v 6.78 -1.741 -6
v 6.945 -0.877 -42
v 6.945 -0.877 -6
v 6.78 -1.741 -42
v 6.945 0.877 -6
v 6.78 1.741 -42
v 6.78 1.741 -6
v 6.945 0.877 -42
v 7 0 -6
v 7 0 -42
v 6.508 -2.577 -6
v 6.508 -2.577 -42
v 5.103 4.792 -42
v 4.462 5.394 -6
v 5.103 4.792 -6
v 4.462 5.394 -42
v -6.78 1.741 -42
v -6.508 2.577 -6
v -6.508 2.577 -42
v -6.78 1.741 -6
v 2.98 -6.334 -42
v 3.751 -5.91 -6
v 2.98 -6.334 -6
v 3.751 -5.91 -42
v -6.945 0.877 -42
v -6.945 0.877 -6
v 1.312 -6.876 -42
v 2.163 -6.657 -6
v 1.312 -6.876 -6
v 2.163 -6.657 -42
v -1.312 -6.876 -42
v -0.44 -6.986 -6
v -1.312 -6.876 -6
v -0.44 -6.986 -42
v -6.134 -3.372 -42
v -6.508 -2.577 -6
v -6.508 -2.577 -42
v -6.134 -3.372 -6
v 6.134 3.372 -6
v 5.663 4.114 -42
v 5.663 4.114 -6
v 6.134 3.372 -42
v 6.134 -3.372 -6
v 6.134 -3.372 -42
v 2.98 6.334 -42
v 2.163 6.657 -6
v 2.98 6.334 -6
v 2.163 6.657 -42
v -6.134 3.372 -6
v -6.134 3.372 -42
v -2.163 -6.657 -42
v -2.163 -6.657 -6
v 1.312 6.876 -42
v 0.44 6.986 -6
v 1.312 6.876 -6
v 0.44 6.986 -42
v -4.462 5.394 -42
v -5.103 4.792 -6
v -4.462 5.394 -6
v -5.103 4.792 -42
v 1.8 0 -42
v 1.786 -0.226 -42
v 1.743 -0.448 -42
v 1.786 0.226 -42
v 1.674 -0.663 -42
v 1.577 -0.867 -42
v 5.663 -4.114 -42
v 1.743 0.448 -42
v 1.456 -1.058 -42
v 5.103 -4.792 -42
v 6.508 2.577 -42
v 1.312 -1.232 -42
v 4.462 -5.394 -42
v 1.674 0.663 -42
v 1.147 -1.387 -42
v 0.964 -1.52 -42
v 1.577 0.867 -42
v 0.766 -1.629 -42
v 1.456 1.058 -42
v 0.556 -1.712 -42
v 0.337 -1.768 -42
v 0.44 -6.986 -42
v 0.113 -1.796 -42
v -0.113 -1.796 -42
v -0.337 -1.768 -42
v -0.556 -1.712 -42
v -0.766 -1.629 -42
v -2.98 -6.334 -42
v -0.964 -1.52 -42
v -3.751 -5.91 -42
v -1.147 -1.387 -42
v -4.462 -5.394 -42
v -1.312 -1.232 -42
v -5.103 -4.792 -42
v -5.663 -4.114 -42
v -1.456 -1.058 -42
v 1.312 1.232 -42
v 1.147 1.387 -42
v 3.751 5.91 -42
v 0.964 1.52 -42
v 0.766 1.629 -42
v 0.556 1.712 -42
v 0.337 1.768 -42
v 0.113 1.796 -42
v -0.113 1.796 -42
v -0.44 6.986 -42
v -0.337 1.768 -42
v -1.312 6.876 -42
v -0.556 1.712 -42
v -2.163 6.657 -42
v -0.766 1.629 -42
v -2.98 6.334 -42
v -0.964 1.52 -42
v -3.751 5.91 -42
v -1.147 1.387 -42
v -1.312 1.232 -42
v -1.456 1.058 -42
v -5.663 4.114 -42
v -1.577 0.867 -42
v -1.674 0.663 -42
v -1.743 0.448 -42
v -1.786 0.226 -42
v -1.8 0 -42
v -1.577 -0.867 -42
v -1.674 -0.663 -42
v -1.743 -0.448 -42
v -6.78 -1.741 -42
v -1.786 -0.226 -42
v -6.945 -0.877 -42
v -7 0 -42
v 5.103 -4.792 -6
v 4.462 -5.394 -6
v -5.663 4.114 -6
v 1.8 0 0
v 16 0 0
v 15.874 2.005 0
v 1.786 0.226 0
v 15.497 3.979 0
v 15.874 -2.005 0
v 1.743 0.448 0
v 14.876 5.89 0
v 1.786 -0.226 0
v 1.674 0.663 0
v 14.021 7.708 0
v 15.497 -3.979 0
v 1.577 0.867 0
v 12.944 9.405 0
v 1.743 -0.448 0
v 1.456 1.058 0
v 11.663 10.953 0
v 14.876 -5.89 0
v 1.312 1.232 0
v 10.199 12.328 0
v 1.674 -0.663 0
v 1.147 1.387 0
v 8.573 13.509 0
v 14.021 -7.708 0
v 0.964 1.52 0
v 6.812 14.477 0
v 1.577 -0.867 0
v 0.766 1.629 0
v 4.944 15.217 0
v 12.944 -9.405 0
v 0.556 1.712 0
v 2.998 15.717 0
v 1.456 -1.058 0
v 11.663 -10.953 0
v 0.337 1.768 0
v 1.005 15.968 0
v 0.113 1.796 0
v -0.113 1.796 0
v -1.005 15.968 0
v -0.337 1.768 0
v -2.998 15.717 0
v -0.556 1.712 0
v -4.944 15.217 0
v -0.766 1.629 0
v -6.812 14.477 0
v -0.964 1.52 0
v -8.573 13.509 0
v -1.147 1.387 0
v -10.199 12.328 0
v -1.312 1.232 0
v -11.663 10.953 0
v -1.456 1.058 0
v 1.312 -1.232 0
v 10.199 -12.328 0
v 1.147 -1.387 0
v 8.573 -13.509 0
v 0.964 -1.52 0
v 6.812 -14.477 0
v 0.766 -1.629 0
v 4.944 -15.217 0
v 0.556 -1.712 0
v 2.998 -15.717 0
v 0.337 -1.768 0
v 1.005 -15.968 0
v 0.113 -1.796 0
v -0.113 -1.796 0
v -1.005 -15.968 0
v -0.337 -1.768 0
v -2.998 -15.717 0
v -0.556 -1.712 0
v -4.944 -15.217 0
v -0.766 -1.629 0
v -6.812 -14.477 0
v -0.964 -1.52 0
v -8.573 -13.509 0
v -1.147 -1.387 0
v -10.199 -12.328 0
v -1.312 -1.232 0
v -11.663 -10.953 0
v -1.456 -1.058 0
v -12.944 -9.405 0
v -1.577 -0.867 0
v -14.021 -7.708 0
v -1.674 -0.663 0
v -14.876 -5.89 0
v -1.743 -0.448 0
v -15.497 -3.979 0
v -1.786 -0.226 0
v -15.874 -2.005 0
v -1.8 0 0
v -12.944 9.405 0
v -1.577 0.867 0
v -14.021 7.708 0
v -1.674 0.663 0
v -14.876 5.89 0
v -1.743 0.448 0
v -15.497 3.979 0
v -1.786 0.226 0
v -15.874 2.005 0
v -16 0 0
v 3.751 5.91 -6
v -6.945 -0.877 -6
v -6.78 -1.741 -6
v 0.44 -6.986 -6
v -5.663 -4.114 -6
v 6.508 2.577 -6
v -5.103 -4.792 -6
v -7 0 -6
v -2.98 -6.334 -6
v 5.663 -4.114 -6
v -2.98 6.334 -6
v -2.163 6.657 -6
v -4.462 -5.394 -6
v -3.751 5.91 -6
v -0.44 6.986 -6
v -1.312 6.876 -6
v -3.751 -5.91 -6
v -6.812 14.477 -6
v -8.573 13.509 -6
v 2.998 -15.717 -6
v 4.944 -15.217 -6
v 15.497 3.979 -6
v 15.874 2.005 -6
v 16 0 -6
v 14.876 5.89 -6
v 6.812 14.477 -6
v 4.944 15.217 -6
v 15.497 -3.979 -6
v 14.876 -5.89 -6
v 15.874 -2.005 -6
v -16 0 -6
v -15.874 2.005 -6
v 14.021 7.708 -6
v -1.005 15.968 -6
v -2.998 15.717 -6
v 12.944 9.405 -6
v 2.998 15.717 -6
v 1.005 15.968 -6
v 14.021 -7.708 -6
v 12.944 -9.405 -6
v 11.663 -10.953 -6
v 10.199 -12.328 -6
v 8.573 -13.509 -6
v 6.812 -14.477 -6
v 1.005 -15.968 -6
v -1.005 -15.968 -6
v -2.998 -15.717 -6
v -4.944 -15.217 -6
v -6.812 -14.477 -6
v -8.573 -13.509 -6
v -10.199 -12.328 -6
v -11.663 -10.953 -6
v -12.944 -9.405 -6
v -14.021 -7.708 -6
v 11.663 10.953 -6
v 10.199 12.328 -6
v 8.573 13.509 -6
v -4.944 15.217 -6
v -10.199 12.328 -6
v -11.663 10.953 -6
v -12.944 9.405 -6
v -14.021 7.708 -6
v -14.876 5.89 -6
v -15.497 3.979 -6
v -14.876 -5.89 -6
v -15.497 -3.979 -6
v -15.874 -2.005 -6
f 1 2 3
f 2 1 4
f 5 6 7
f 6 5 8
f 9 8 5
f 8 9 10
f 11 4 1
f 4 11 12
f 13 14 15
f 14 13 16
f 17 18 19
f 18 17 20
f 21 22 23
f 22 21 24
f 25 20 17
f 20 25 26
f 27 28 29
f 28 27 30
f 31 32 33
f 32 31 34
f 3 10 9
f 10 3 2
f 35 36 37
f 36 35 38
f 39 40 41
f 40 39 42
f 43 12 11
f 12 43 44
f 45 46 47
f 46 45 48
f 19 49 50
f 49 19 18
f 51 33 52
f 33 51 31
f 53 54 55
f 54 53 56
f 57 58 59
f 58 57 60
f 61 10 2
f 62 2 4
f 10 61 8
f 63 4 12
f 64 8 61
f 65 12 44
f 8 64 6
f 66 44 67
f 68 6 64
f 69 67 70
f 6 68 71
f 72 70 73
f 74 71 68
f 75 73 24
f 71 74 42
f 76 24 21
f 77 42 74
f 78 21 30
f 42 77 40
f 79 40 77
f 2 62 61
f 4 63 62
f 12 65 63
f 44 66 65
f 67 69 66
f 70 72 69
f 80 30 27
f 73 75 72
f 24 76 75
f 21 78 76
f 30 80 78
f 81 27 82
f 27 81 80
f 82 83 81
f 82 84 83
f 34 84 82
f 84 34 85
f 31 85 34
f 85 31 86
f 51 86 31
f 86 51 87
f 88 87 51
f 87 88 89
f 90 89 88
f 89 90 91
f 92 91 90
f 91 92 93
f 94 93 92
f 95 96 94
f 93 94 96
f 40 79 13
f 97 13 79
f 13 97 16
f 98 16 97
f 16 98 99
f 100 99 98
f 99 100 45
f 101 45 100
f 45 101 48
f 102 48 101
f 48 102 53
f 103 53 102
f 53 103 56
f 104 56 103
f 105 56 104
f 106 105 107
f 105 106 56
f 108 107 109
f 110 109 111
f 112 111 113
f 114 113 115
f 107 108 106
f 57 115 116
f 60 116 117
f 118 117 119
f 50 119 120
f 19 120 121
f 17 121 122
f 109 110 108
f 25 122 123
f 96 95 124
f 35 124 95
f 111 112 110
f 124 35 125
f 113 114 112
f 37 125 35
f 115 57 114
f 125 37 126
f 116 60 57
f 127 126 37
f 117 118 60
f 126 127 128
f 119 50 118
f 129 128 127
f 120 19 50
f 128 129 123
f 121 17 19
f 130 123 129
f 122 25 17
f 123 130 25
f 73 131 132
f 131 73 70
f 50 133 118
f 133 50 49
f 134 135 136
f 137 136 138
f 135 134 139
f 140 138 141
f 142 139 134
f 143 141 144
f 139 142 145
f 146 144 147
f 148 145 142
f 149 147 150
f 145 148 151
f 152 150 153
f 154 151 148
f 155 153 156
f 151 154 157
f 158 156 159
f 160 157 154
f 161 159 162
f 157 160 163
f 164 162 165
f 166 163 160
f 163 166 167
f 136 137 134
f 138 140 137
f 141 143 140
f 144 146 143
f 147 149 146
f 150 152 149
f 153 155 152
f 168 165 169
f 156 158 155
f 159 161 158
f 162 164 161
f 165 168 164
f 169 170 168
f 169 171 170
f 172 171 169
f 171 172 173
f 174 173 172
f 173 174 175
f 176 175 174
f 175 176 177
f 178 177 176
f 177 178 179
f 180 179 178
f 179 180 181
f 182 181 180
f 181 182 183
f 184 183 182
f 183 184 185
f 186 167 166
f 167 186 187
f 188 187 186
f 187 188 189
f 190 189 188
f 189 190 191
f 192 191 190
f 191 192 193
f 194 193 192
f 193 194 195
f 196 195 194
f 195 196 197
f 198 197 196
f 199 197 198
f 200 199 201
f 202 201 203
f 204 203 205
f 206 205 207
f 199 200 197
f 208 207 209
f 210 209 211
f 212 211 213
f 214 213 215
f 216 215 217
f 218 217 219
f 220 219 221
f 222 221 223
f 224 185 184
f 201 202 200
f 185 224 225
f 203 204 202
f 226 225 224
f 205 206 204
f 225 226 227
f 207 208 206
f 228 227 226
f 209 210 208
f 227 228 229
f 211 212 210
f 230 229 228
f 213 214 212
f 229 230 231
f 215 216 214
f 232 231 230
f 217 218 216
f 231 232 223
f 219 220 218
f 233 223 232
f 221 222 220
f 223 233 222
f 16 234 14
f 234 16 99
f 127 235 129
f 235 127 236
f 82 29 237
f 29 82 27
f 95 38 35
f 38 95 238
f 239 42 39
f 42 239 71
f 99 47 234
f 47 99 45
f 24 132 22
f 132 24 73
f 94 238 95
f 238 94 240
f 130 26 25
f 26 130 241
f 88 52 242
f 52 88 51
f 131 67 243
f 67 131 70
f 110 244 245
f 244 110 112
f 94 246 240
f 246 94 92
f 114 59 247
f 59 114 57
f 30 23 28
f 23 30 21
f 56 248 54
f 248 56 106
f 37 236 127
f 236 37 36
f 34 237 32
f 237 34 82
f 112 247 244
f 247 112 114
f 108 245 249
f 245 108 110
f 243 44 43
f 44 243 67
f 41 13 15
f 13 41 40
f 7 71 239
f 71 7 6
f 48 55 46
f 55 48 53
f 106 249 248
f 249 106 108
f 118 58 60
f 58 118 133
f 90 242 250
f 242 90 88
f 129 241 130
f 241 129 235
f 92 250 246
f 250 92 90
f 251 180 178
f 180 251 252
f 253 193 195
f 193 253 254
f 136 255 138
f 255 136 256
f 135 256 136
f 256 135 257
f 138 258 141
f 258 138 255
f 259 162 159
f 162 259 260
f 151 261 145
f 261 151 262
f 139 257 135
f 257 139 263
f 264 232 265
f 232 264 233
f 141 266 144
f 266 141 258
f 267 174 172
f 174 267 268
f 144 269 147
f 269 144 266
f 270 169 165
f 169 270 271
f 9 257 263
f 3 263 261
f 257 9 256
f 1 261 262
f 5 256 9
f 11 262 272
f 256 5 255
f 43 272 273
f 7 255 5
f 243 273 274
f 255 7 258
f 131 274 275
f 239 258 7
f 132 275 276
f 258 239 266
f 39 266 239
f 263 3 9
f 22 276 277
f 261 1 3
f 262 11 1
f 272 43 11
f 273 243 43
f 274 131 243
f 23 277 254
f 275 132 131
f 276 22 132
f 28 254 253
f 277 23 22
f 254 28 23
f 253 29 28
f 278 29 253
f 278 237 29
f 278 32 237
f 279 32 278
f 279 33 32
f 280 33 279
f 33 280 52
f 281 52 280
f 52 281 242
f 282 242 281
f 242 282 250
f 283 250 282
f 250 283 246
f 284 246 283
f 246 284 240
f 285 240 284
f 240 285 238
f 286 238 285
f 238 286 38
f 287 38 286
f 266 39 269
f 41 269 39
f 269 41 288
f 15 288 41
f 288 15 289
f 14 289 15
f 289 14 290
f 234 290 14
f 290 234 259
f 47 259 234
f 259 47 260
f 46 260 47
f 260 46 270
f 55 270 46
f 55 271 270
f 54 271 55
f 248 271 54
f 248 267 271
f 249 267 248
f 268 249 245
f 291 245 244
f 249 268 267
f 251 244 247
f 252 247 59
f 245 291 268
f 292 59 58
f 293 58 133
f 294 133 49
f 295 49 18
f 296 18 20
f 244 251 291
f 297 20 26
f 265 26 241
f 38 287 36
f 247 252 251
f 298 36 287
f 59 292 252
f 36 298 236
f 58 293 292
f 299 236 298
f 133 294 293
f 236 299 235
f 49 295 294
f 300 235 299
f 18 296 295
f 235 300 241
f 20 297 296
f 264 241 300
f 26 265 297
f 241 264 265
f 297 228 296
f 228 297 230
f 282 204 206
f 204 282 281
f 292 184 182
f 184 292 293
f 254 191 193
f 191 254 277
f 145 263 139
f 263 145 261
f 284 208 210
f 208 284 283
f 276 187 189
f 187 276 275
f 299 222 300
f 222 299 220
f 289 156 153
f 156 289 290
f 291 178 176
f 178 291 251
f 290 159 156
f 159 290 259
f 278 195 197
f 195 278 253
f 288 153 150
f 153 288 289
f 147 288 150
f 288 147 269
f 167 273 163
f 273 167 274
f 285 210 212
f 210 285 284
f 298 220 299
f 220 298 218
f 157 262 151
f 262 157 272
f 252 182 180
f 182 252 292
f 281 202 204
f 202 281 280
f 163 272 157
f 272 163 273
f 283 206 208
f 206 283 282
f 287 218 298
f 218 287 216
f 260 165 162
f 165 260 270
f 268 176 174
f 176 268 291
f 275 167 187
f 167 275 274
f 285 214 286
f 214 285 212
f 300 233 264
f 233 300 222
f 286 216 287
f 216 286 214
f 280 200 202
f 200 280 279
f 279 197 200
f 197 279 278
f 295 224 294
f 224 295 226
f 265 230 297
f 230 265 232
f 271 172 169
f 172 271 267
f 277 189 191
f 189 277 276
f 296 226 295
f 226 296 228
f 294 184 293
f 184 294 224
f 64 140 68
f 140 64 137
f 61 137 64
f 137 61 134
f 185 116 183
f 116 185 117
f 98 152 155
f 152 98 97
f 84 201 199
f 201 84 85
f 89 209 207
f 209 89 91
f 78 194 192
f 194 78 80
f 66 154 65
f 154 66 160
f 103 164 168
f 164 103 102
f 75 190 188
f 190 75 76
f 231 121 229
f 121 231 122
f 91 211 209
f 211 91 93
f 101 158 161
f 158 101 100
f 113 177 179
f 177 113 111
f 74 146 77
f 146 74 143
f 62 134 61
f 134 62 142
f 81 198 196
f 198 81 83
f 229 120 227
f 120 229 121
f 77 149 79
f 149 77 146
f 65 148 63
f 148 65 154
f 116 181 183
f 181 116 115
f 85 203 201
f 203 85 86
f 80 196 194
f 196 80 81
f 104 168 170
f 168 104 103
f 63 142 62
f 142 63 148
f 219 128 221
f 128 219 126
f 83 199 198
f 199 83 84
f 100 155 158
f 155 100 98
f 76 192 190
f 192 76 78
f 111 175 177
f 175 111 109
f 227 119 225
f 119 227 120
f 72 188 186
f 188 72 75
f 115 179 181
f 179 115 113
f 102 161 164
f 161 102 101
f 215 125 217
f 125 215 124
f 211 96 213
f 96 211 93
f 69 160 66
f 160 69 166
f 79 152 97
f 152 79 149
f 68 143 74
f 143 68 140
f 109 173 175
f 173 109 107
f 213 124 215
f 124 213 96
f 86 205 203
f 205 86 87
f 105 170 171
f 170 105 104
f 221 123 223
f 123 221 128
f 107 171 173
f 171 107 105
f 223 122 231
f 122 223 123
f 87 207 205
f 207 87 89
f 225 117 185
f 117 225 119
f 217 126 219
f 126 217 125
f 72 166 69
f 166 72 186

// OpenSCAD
$fn = 50;


difference() {
	union() {
		translate(v = [0, 0, -42.0000000000]) {
			cylinder(h = 42, r = 7.0000000000);
		}
		translate(v = [0, 0, -6.0000000000]) {
			cylinder(h = 6, r = 16.0000000000);
		}
	}
	union() {
		#translate(v = [0, 0, -42]) {
			cylinder(h = 42, r = 1.8000000000);
		}
	}
}
